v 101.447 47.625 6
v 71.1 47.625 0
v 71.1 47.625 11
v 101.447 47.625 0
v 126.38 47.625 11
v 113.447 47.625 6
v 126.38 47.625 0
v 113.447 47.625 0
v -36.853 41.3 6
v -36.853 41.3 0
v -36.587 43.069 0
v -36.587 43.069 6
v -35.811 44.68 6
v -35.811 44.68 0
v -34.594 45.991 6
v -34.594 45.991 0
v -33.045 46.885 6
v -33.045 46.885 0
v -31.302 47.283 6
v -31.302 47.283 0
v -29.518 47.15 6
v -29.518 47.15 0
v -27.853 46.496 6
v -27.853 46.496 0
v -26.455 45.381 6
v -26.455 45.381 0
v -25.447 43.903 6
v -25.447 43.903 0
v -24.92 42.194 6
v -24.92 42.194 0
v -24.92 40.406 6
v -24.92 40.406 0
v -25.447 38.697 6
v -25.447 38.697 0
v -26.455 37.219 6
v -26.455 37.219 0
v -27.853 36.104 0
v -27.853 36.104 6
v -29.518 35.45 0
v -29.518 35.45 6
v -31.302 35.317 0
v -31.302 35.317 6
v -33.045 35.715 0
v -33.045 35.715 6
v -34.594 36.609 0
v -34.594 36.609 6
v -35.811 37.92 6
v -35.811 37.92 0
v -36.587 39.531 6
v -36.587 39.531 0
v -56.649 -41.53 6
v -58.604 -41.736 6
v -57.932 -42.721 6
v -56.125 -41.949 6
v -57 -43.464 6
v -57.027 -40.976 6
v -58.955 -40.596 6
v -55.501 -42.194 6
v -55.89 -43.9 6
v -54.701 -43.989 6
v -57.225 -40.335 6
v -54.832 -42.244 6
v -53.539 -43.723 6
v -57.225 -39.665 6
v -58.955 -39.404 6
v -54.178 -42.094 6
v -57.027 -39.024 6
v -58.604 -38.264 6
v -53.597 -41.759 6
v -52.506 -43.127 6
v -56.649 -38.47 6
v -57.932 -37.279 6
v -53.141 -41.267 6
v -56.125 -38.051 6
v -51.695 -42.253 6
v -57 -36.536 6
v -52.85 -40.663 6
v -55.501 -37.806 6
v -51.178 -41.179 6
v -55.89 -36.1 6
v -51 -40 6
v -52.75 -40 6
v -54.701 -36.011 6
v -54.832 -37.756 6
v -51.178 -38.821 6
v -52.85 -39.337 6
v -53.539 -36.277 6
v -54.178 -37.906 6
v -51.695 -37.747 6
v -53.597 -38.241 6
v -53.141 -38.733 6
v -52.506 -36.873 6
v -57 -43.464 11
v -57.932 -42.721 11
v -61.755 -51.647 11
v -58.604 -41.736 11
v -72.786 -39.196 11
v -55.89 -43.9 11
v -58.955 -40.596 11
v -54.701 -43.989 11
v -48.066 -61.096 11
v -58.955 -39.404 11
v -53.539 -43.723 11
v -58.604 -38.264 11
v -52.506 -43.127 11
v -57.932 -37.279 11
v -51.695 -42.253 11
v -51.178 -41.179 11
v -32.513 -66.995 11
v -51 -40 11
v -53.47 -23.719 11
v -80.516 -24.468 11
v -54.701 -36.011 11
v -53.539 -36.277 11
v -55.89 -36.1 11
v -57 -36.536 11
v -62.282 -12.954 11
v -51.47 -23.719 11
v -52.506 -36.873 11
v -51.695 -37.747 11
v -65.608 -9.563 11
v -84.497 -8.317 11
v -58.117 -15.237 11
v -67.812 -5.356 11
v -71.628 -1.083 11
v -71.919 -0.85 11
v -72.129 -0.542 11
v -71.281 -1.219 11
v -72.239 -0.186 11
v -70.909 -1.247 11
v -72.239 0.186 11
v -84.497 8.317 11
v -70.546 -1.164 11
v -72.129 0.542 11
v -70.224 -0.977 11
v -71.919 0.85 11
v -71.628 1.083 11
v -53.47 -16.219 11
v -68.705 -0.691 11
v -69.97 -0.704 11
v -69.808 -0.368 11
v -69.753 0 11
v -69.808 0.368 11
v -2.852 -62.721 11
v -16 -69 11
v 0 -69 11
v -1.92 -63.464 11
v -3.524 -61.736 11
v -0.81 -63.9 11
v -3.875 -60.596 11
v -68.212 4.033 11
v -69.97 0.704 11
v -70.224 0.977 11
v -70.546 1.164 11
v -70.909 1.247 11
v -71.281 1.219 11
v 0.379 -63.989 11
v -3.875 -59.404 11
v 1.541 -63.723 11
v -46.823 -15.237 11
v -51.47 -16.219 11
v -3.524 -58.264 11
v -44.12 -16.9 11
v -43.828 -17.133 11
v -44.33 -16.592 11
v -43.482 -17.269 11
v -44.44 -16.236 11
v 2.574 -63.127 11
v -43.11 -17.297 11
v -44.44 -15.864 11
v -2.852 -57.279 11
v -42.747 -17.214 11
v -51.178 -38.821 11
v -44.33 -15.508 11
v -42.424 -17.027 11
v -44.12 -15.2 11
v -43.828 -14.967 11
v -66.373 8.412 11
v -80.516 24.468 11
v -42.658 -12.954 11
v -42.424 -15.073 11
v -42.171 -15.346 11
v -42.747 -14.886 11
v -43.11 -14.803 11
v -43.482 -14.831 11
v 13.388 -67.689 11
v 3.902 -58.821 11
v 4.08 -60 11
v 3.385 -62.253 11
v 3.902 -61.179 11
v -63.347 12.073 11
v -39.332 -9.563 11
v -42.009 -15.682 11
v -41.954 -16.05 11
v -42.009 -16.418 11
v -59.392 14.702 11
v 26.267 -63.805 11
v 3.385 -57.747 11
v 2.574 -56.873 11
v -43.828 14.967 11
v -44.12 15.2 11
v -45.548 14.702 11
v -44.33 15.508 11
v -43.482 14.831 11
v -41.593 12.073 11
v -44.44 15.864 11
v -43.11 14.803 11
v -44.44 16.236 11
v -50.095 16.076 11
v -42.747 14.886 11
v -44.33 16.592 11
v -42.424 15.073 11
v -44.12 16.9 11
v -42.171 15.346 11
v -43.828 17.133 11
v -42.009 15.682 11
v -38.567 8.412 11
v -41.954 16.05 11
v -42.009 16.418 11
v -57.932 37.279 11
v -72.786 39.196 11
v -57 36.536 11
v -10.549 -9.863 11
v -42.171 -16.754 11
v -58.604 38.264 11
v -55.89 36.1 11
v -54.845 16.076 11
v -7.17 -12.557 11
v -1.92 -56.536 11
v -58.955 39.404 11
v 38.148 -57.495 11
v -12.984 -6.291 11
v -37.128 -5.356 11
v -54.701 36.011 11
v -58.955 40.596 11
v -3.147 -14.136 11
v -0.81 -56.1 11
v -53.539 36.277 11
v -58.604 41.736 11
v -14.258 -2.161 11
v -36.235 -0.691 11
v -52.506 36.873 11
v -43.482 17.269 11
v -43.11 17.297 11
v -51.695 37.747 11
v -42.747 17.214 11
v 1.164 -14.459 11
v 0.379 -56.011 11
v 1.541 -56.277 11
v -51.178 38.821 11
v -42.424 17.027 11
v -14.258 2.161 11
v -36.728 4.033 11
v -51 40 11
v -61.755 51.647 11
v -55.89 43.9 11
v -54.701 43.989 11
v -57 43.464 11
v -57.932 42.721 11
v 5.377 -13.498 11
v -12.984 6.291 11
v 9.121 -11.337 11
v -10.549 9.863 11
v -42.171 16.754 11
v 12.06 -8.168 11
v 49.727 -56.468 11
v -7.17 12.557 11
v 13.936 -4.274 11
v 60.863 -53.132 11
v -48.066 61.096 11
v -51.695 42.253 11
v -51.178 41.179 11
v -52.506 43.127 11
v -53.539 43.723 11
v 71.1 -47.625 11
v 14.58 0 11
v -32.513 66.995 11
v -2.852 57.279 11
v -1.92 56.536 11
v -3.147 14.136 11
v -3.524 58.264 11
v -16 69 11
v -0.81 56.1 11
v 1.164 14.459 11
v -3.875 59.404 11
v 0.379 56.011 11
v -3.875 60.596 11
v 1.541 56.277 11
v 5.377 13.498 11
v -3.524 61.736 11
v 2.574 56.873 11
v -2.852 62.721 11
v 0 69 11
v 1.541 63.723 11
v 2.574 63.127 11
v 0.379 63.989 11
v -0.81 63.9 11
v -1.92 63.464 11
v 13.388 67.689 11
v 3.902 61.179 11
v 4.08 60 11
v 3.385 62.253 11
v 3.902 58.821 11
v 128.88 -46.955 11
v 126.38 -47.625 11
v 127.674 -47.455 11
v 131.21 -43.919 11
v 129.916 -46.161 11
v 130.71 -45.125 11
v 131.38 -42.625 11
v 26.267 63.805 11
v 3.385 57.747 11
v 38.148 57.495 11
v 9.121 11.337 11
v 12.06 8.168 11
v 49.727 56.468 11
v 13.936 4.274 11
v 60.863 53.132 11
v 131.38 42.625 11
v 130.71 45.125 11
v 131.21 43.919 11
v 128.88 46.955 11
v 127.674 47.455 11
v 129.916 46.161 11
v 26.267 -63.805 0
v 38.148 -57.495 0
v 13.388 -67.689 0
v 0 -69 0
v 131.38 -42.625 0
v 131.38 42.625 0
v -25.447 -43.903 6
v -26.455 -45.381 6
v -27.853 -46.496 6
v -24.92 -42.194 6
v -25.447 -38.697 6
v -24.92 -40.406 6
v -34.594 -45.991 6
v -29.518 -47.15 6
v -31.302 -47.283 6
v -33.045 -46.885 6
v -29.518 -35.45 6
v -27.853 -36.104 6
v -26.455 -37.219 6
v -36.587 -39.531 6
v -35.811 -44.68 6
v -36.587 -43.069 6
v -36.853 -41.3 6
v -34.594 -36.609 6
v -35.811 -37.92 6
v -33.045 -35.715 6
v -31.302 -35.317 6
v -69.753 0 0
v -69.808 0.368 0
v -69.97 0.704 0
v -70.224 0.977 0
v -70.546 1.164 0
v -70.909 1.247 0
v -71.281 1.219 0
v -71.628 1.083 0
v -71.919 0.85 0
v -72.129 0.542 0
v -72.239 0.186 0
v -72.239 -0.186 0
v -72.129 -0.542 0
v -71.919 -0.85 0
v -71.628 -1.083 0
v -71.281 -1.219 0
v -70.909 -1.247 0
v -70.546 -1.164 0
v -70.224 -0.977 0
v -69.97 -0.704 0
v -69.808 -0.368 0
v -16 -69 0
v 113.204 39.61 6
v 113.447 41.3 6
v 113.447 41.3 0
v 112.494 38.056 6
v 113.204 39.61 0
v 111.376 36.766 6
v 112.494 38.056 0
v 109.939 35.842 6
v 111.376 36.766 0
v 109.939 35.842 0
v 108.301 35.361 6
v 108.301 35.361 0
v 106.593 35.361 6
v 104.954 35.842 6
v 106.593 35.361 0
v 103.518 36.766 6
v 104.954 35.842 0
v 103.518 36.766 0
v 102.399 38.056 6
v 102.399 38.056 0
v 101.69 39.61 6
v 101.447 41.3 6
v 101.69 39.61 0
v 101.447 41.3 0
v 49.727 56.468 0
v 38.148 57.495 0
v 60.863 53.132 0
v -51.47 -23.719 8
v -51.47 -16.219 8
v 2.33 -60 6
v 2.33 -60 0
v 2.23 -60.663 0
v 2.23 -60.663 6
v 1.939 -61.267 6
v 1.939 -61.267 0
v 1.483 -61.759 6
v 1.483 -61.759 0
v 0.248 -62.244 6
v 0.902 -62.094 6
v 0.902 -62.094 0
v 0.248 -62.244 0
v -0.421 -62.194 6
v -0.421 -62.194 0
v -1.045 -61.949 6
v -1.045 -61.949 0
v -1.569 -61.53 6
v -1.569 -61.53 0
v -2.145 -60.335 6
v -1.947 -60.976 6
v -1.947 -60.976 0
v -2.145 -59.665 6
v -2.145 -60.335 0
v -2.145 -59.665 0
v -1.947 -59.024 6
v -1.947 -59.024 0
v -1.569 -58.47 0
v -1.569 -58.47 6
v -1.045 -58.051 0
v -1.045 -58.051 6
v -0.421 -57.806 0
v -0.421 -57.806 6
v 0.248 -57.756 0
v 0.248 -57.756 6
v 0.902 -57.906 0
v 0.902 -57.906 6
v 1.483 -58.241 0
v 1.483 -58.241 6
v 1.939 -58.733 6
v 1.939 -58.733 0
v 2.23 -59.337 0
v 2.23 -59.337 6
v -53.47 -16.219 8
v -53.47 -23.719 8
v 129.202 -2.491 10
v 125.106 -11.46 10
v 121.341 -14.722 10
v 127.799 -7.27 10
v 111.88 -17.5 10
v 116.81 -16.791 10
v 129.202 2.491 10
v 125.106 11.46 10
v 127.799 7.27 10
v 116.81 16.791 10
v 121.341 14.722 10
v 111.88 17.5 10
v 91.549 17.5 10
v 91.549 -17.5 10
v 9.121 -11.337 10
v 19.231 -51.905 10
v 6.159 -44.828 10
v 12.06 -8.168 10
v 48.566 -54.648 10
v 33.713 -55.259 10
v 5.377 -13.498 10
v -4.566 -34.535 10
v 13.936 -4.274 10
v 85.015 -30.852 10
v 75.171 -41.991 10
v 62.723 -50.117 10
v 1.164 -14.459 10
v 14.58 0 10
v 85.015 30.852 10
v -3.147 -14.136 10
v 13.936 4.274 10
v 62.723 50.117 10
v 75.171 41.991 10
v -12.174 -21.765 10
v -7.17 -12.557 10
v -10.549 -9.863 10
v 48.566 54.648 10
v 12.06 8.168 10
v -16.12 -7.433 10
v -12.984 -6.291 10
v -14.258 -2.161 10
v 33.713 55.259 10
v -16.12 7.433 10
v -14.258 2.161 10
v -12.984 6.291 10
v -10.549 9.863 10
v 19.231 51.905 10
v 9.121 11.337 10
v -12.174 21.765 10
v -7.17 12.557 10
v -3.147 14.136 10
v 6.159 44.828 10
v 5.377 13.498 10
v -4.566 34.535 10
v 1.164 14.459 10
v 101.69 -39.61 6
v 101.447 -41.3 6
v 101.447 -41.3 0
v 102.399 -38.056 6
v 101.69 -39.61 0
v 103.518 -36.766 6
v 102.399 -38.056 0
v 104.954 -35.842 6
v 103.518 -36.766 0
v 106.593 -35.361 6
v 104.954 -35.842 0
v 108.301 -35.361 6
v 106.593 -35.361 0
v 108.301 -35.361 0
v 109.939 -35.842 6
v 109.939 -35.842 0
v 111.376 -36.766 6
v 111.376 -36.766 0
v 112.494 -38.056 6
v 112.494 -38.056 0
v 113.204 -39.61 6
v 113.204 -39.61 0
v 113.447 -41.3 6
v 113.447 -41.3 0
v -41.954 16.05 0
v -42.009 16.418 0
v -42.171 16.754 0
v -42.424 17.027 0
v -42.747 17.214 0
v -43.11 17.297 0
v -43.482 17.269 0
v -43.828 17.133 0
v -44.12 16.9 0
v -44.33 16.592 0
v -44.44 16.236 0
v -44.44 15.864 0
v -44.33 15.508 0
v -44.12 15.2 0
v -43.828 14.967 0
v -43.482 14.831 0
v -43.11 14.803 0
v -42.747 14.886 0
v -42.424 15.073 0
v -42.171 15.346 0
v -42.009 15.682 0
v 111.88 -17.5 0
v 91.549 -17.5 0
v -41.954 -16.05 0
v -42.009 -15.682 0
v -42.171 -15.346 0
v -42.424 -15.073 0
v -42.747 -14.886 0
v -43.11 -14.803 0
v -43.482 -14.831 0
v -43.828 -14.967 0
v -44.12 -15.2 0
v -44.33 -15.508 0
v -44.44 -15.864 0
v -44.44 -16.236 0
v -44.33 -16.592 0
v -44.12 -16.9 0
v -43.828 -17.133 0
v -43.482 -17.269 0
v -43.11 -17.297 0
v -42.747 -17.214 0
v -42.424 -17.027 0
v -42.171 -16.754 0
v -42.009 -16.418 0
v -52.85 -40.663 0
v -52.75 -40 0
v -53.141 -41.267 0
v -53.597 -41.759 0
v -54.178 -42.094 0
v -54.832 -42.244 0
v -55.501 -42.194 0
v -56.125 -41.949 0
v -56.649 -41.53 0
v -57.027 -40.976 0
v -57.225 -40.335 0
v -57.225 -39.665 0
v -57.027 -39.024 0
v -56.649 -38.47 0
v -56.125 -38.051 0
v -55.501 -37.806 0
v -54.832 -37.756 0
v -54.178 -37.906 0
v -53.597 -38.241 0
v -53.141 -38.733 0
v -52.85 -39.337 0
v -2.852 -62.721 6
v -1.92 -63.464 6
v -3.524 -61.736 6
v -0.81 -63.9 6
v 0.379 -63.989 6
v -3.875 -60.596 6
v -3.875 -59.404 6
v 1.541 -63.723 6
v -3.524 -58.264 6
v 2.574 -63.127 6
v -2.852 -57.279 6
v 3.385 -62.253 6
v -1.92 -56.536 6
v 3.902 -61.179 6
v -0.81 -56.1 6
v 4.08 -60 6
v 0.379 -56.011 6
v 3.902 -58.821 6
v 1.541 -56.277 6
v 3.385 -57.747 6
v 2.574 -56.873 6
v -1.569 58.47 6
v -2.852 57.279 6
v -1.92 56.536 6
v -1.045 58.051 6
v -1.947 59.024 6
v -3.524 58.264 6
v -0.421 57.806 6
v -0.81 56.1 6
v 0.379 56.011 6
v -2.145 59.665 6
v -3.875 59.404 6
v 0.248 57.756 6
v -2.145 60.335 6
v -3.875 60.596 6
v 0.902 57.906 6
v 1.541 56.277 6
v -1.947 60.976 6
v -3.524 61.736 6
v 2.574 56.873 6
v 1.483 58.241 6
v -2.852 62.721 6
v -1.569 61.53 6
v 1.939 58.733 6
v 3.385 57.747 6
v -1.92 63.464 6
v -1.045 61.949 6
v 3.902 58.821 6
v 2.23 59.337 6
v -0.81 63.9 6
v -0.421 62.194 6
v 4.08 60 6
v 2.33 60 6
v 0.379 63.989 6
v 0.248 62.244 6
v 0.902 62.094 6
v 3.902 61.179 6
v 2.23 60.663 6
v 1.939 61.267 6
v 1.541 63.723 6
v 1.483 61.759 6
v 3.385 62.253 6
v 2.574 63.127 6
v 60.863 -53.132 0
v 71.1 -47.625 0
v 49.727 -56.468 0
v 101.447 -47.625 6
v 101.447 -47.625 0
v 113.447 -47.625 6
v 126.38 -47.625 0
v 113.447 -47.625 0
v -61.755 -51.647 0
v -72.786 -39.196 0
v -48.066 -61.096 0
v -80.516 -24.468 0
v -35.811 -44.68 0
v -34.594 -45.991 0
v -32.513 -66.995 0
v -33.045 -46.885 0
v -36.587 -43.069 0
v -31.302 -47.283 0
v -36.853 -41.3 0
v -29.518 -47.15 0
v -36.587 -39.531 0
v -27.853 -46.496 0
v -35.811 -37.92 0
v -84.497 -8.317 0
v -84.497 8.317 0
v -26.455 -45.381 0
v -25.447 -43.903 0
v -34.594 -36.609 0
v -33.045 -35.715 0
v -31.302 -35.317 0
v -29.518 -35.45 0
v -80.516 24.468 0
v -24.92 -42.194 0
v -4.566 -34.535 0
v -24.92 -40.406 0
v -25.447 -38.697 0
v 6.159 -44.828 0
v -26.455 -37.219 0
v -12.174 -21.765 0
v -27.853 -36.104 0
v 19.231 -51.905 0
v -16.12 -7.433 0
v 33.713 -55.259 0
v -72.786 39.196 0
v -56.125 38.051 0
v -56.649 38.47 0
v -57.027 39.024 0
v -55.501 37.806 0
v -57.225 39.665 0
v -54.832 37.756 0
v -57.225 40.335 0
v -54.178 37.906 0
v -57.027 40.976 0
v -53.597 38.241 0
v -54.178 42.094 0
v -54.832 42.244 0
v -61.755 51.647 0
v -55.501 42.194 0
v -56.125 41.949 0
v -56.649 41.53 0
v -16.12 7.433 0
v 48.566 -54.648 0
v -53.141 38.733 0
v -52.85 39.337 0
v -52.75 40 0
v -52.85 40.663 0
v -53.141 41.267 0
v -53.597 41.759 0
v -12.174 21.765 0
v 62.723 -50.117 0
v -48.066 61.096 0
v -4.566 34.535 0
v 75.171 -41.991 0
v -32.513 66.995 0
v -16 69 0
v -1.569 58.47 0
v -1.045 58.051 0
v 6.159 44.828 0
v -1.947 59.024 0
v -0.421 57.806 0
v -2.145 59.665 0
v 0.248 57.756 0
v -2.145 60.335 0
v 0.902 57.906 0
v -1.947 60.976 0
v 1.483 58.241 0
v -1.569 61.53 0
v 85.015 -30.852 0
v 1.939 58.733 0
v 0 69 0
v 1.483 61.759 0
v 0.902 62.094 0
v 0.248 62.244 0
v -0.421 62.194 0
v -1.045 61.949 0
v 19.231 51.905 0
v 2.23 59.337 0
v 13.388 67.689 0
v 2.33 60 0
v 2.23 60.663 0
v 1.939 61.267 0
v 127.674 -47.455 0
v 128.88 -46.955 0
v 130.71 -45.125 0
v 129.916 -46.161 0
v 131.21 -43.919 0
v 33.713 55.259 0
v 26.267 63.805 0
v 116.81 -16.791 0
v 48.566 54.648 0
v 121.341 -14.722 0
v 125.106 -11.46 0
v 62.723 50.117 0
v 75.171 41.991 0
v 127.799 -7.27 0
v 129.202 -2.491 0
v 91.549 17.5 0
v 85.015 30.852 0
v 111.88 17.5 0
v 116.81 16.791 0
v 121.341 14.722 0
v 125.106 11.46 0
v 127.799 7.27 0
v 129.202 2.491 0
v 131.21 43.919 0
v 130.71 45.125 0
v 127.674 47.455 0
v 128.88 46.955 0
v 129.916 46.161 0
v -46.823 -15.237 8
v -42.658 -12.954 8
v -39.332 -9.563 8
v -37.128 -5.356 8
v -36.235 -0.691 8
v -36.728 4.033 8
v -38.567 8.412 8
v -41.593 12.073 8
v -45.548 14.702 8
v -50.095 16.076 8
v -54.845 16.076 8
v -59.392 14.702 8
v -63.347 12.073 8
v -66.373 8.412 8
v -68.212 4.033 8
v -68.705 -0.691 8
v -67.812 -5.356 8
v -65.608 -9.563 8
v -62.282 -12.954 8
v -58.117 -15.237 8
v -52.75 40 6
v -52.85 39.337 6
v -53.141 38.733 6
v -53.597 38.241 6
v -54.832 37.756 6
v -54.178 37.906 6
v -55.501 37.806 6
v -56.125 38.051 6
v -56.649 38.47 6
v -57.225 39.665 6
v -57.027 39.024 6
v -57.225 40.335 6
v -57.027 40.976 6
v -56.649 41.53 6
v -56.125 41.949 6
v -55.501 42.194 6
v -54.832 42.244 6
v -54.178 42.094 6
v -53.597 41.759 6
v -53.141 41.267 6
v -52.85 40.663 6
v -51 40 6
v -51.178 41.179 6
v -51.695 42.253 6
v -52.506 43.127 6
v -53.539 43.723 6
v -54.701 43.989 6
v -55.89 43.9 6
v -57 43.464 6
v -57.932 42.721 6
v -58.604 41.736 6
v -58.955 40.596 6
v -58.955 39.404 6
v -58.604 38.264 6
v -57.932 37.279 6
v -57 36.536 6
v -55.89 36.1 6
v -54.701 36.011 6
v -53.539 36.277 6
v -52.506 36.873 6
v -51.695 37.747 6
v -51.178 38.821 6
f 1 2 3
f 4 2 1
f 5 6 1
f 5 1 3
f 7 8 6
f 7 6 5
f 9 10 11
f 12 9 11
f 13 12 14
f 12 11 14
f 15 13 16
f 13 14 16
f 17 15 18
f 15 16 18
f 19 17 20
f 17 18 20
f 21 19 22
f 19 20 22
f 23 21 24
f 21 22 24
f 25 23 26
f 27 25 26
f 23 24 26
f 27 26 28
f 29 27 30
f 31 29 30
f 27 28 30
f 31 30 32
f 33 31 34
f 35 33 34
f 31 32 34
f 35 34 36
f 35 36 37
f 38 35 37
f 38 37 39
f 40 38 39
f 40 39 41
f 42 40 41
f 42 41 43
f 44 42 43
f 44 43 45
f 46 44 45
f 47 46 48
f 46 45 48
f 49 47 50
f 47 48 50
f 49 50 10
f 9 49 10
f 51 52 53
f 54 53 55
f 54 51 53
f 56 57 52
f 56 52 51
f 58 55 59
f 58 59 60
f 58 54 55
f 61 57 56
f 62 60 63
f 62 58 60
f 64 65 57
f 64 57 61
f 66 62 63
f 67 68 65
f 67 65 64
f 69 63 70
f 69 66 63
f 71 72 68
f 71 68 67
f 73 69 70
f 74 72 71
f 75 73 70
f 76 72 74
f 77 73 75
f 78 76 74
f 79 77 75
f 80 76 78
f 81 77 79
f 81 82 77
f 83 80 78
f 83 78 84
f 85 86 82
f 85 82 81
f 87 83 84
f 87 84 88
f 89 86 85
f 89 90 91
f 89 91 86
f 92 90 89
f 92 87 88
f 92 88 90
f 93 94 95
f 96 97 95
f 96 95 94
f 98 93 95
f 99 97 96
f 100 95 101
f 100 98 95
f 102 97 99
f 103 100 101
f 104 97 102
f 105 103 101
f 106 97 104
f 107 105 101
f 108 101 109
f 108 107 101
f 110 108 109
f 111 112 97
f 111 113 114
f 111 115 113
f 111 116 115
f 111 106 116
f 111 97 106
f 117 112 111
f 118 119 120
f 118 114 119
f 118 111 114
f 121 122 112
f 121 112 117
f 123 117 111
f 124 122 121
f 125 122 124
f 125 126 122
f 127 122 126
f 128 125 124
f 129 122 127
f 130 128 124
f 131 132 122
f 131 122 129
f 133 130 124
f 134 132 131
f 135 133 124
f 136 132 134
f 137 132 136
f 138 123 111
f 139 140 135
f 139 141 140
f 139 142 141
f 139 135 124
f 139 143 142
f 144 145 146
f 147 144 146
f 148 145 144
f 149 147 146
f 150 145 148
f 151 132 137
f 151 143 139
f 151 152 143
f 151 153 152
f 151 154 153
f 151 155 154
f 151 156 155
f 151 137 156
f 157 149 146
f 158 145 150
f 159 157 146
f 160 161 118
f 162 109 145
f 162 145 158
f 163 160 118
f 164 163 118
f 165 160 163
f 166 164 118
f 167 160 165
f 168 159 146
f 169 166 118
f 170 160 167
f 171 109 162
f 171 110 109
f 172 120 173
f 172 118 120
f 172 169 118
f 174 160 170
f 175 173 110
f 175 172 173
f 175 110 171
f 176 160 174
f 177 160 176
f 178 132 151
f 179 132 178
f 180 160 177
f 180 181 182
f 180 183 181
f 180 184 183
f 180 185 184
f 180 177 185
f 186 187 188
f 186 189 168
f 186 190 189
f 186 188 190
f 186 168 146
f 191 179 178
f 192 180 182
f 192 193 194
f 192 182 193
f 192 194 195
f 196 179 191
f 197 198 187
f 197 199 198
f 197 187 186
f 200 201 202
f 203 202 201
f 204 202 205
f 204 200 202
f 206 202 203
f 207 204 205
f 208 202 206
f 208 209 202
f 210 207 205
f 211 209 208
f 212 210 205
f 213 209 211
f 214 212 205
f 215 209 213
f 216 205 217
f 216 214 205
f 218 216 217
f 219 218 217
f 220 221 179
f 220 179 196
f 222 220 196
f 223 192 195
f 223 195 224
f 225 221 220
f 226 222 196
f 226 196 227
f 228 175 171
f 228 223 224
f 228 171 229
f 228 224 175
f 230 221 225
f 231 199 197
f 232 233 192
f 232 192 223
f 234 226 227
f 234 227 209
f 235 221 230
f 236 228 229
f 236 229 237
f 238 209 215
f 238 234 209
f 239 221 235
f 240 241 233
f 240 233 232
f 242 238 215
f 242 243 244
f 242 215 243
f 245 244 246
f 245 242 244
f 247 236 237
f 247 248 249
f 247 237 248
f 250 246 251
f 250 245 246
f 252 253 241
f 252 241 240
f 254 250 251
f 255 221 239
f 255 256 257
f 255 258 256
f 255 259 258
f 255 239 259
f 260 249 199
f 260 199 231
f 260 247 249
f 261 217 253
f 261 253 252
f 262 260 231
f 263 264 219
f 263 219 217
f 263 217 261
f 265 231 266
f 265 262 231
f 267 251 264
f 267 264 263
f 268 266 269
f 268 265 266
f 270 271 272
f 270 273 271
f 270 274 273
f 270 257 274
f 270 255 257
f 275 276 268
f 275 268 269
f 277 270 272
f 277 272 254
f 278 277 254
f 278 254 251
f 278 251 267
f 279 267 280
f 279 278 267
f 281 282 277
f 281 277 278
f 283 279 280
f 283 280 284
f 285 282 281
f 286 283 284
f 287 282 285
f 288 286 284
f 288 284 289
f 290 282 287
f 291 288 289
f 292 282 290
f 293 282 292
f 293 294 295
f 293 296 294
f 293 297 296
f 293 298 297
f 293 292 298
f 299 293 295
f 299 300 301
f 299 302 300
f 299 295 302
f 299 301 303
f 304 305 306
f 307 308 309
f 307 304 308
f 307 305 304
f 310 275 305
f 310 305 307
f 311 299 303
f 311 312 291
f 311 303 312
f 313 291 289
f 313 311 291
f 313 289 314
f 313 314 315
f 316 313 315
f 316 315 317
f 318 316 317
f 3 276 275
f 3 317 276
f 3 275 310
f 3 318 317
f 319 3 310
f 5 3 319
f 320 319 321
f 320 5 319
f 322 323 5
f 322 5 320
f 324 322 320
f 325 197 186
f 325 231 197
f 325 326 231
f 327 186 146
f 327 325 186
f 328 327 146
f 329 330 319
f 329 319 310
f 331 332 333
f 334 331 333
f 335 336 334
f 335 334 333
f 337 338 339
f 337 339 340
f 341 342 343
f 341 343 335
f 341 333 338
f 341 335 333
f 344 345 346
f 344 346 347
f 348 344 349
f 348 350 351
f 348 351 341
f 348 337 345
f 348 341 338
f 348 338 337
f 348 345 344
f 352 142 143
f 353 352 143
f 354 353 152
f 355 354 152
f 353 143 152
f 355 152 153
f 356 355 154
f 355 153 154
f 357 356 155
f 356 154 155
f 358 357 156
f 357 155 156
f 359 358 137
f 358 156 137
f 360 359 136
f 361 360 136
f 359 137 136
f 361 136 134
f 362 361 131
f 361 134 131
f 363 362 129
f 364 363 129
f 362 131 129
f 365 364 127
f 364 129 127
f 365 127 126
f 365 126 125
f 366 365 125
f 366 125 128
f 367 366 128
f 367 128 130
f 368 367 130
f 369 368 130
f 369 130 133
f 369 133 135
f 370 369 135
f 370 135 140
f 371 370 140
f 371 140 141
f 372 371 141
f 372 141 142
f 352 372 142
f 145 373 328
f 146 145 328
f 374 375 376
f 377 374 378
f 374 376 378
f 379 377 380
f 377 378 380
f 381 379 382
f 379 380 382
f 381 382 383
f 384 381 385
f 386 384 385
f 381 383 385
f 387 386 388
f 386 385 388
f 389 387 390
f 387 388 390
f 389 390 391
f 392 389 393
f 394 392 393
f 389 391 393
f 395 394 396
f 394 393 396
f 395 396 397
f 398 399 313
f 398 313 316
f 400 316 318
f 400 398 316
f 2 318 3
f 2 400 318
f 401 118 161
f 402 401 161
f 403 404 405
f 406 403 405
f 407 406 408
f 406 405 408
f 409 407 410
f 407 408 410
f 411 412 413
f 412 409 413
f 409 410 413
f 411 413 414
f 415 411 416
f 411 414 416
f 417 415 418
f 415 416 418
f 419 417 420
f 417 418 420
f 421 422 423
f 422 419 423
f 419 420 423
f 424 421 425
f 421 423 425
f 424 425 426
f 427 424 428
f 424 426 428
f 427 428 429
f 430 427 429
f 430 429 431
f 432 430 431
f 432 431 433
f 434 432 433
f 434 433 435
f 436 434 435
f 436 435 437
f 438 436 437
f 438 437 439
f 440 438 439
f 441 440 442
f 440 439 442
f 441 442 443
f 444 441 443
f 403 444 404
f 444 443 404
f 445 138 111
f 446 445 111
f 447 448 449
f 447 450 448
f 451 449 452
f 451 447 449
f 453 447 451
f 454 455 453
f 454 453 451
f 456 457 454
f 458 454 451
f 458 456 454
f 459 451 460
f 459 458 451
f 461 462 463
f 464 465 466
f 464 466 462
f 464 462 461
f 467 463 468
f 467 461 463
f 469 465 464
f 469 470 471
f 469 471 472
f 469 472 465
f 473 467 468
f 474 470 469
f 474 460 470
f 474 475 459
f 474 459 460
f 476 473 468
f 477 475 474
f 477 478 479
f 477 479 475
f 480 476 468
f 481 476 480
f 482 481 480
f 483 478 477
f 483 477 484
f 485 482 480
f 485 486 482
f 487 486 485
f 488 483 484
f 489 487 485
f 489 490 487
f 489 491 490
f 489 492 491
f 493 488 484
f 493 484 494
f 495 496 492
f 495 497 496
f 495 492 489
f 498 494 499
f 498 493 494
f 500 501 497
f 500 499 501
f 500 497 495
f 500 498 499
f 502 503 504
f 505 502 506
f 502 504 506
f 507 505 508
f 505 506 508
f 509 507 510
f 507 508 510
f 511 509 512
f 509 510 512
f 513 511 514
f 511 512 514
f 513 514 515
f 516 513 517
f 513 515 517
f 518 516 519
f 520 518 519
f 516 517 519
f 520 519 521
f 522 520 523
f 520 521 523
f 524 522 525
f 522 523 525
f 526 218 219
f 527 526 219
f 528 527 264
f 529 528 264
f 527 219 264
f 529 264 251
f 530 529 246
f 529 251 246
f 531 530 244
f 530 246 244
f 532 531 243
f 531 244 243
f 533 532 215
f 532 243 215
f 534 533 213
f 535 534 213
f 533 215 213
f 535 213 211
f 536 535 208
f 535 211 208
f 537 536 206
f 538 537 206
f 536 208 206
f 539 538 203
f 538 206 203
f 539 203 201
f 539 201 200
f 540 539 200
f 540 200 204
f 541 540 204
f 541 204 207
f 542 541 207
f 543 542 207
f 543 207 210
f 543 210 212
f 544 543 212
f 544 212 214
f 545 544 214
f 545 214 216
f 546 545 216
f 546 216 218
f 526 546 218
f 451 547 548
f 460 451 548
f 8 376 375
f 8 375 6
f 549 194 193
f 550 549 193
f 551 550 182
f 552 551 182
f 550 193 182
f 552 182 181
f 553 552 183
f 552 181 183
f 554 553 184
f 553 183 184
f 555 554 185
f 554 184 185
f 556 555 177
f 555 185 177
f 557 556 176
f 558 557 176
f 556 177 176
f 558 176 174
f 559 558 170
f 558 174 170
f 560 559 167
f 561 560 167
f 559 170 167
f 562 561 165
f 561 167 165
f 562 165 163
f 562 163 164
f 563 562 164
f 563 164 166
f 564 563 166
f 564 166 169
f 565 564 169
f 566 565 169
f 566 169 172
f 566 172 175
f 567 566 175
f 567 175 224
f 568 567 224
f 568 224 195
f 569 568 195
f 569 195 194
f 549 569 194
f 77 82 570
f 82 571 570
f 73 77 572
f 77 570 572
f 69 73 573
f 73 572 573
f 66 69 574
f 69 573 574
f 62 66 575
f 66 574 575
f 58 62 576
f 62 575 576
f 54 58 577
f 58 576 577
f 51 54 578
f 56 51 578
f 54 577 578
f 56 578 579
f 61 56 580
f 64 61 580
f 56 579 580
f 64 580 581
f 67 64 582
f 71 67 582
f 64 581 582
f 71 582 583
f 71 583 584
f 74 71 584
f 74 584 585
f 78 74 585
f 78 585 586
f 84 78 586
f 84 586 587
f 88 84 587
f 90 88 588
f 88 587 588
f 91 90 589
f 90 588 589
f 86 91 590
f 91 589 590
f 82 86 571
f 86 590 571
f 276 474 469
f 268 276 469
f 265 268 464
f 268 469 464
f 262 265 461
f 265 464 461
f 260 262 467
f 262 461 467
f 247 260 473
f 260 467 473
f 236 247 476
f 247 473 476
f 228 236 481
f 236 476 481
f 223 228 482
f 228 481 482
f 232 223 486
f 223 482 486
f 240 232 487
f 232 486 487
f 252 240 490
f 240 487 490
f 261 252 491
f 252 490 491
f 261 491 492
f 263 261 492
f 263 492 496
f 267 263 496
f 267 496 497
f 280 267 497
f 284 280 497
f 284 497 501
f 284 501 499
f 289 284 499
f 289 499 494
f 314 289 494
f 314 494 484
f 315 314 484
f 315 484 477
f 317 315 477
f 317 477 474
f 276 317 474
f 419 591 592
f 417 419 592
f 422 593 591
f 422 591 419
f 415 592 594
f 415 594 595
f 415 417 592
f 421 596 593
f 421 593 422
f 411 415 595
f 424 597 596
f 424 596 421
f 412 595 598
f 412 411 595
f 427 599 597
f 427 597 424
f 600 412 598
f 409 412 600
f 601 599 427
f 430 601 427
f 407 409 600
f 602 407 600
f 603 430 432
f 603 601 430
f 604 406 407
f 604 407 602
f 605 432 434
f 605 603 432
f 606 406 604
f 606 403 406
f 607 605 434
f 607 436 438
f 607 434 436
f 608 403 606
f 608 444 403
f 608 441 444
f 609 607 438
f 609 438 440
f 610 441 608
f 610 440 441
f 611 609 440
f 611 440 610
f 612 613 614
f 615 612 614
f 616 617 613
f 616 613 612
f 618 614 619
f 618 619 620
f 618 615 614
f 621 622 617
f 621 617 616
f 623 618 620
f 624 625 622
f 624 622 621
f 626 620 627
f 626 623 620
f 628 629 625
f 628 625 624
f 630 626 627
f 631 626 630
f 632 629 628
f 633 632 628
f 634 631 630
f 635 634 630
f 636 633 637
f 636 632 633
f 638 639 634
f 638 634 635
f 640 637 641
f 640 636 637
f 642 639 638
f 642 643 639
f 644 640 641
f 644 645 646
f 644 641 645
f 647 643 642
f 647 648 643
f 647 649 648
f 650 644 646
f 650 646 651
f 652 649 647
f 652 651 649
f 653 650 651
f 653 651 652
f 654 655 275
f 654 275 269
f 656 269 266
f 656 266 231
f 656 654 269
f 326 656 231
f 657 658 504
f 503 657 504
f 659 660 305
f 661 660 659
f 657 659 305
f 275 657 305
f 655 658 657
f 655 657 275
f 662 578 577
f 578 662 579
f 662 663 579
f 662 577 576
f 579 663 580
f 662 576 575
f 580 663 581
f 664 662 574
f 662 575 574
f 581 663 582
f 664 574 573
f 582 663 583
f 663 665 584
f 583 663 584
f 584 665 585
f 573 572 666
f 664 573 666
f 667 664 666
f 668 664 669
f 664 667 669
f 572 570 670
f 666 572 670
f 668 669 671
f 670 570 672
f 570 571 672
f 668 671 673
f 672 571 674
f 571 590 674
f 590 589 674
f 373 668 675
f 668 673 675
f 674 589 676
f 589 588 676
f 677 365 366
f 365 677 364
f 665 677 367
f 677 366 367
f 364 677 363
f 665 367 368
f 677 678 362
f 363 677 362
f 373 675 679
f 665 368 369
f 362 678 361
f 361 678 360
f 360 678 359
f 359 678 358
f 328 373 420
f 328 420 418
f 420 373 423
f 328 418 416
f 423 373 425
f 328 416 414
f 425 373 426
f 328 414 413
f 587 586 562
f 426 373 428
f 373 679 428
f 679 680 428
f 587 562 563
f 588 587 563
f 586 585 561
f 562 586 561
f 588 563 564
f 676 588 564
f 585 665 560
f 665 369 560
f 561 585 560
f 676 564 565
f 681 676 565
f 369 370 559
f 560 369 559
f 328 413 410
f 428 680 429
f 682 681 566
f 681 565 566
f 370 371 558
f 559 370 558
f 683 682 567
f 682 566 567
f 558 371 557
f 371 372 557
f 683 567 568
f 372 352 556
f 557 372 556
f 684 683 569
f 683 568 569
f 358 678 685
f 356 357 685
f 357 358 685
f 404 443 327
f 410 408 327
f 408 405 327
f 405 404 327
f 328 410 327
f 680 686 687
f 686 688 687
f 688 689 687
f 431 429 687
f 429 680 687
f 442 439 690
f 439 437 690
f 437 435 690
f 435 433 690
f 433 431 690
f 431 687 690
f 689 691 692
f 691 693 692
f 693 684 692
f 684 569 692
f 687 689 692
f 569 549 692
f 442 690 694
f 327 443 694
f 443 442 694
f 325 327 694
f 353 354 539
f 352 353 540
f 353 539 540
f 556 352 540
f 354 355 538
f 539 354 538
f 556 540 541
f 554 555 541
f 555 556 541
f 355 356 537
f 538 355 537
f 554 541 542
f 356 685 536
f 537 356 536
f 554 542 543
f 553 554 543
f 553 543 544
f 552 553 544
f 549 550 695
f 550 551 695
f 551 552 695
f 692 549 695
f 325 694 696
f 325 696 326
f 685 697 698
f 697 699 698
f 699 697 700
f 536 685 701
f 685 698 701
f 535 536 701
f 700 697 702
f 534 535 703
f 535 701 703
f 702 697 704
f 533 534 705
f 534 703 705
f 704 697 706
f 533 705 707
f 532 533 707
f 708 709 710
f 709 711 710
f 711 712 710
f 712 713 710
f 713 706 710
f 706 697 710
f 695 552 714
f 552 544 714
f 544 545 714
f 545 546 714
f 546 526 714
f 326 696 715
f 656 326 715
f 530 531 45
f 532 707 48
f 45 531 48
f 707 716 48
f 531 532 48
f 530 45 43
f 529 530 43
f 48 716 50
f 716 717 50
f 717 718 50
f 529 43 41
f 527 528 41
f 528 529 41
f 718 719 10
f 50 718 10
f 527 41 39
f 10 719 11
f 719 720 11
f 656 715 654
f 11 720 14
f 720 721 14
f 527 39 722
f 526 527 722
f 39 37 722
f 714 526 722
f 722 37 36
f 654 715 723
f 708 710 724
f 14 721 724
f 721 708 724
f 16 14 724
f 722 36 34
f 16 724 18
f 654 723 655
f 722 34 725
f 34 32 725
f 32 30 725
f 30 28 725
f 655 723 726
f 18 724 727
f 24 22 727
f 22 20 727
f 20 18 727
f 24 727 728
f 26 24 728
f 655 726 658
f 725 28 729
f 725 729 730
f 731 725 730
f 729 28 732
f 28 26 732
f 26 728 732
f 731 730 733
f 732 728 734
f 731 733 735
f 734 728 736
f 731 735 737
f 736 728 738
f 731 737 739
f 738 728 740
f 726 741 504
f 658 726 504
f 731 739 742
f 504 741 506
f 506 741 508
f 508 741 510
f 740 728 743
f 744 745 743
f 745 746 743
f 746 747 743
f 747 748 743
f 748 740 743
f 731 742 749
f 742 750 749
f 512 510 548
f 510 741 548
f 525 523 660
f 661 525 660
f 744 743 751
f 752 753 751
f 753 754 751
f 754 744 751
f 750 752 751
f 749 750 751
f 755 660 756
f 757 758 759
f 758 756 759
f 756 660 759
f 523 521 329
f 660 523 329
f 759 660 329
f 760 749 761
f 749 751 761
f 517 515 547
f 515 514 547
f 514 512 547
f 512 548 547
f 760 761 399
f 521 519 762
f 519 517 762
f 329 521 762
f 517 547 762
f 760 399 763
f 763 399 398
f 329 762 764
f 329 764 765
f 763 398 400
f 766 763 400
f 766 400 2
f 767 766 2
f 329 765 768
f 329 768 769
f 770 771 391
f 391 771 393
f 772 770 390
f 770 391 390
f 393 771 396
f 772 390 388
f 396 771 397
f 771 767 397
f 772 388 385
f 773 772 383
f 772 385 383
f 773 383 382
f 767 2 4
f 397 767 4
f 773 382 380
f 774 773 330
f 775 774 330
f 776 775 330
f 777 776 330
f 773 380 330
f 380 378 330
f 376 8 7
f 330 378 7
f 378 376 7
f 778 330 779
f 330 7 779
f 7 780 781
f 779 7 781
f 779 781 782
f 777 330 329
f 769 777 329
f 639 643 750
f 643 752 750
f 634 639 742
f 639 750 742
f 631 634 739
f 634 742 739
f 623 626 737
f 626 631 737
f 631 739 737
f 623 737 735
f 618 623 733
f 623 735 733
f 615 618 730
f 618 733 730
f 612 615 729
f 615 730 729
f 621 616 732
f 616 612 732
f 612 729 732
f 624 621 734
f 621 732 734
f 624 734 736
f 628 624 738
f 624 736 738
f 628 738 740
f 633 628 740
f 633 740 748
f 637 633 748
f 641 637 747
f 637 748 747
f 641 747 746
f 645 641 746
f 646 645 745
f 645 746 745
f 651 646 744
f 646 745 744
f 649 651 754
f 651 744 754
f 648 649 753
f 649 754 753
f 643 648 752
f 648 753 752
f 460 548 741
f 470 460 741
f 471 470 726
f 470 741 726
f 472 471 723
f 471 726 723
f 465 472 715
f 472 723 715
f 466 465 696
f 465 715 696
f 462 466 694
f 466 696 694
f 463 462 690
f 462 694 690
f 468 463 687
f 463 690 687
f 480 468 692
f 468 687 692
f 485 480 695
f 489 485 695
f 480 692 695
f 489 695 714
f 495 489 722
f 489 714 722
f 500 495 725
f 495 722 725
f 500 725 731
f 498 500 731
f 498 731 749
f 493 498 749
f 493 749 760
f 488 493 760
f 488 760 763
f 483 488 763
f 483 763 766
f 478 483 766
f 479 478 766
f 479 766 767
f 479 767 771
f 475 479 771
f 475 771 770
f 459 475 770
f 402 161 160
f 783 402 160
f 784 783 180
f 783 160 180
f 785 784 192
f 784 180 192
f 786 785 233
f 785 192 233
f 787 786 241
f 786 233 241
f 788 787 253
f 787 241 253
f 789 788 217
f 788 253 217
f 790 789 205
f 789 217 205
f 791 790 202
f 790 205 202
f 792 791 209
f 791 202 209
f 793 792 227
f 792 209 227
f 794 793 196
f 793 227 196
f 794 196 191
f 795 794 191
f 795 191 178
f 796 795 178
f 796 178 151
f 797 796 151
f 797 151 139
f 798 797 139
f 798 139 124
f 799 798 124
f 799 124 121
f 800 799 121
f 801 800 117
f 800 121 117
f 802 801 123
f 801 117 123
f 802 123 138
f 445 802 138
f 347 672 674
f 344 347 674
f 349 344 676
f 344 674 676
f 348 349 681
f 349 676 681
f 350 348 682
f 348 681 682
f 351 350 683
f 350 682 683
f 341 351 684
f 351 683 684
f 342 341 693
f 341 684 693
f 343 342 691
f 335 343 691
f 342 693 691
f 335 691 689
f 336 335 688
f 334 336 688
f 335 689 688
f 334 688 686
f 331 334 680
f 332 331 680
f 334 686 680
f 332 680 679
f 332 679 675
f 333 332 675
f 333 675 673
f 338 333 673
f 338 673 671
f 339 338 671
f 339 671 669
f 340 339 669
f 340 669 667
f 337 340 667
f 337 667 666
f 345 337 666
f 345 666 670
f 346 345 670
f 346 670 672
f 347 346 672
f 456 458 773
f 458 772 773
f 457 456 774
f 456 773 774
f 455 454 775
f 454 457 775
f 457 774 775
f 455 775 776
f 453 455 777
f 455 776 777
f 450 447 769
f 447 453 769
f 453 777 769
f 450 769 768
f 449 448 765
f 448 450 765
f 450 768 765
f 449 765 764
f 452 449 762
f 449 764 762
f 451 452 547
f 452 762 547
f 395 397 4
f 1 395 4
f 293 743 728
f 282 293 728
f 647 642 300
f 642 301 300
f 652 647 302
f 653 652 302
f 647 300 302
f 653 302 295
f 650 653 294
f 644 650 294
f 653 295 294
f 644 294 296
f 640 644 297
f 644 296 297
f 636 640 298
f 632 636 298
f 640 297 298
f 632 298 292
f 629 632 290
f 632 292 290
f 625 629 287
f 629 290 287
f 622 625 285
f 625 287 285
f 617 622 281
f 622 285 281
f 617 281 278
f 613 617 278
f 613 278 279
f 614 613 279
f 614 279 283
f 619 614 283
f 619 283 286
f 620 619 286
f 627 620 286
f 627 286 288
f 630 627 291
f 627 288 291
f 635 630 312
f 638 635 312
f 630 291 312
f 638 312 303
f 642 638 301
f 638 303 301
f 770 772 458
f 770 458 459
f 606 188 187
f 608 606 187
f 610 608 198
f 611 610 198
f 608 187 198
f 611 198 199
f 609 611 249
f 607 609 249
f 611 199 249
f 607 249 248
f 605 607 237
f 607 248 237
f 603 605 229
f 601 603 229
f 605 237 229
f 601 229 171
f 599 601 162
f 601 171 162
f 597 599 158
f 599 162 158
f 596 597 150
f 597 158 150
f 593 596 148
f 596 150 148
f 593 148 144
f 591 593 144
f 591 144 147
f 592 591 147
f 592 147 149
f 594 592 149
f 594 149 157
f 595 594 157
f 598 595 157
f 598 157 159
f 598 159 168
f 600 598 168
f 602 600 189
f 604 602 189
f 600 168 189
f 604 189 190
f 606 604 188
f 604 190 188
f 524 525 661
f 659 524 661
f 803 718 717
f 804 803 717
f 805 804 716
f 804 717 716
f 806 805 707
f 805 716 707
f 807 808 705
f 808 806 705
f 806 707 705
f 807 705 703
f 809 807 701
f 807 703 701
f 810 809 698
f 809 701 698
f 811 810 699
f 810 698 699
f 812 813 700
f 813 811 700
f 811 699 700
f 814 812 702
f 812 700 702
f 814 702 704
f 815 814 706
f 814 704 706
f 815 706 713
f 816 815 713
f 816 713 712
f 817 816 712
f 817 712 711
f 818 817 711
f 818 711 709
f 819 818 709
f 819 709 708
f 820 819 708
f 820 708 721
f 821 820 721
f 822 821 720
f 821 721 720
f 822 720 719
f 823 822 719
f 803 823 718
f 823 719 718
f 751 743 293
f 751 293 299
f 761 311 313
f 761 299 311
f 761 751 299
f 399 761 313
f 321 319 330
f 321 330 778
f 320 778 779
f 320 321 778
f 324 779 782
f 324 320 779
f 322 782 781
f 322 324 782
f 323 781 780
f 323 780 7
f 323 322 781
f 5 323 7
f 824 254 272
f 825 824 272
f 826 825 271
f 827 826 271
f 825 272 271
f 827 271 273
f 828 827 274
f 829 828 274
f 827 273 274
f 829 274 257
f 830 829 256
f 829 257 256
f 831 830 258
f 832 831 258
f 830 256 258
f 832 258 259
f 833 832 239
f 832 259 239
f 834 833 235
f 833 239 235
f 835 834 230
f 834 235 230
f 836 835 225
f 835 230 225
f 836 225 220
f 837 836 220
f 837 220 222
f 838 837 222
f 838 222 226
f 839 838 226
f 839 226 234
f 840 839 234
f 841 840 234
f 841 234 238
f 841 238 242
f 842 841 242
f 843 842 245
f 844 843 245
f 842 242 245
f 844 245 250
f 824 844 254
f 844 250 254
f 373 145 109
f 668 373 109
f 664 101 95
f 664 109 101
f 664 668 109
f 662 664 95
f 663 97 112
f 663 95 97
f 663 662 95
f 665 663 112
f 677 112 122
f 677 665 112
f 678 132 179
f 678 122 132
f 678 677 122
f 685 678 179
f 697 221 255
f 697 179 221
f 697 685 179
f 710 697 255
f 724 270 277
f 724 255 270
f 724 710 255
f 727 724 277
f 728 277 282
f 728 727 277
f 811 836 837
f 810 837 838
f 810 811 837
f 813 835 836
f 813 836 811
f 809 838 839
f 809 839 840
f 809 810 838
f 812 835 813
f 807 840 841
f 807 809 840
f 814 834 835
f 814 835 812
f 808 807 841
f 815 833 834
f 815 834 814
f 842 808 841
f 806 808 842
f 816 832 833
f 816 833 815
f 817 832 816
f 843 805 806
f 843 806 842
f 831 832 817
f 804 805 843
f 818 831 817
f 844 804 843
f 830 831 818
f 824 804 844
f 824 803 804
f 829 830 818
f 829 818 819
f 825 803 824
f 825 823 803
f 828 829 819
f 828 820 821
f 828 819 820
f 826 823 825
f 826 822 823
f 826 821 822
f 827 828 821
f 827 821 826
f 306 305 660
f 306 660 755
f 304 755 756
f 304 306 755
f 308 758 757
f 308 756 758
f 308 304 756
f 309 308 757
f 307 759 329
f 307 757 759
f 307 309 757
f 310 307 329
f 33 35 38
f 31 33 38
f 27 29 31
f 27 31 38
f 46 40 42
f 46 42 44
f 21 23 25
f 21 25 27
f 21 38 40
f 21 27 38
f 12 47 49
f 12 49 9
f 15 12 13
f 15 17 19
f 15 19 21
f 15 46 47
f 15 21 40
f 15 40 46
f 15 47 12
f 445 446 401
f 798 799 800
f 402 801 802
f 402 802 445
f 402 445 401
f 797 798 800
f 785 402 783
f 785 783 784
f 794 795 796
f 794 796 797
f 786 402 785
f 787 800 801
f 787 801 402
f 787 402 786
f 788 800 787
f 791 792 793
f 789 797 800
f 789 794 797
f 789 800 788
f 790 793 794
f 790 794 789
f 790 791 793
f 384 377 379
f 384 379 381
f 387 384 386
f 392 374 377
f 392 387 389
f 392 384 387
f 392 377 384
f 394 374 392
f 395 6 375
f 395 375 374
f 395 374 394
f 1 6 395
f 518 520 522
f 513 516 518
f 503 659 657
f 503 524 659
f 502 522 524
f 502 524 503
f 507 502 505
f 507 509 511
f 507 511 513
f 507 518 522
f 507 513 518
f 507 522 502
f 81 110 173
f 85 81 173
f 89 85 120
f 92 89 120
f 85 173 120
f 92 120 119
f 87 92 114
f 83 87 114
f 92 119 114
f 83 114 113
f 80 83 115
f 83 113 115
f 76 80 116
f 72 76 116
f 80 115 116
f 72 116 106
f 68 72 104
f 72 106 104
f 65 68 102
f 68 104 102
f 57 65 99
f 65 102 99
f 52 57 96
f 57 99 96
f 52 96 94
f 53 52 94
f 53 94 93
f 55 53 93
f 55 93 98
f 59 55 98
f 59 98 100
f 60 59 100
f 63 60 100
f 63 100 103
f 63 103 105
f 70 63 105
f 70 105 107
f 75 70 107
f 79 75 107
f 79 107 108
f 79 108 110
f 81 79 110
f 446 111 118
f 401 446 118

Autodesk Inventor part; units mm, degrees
ref_plane "YZ Plane" through (0, 0, 0) normal (1, 0, 0) x (0, 1, 0)
ref_plane "XZ Plane" through (0, 0, 0) normal (0, 1, 0) x (-1, 0, 0)
ref_plane "XY Plane" through (0, 0, 0) normal (0, 0, 1) x (1, 0, 0)
sketch "Sketch1" plane through (0, 0, 0) normal (0, 0, 1) x (1, 0, 0)
  line L0 (-19.2849, 35) -> (-19.2849, -35) construction
  line L1 (19.7114, 54.5) -> (19.7114, -54.5) construction
  line L2 (-19.2849, 35) -> (19.7114, 54.5) construction
  line L3 (-19.2849, -35) -> (19.7114, -54.5) construction
  circle A0 centre (0.08, 0) radius 14.5
  line L4 (-19.2849, 35) -> (0.08, 0) construction
  line L5 (0.08, 0) -> (-19.2849, -35) construction
  circle A1 centre (19.7114, 54.5) radius 1.6 construction
  circle A2 centre (-19.2849, 35) radius 1.6 construction
  circle A3 centre (-19.2849, -35) radius 1.6 construction
  circle A4 centre (19.7114, -54.5) radius 1.6 construction
  line L6 (-16, -69) -> (0, -69)
  line L7 (0, 69) -> (-16, 69)
  arc A5 (-16, 69) -> (-16, -69) centre (-16, 0) ccw
  arc A6 (0, -69) -> (0, 69) centre (0, 0) ccw
  line L8 (-85, 0) -> (69, 0) construction
  circle A7 centre (-19.2849, 35) radius 3 construction
  circle A8 centre (-19.2849, -35) radius 3 construction
  circle A9 centre (19.7114, 54.5) radius 3 construction
  circle A10 centre (19.7114, -54.5) radius 3 construction
  line L9 (0.08, 60) -> (0.08, -60) construction
  line L10 (-55, -40) -> (-55, 40) construction
  circle A11 centre (-55, 40) radius 2.25
  circle A12 centre (-55, -40) radius 2.25
  circle A13 centre (0.08, -60) radius 2.25
  circle A14 centre (0.08, 60) radius 2.25
  point P0 (-19.2849, 0)
  point P1 (19.7114, 0)
  point P2 (-55, 0)
  dimension "d0" = 70
  dimension "d1" = 109
  dimension "d2" = 43.6
  dimension "d3" = 29
  dimension "d4" = 40
  dimension "d5" = 3.2
  dimension "d7" = 138
  dimension "d8" = 154
  dimension "d33" = 6
  dimension "d55" = 85.08
  dimension "d74" = 80
  dimension "d76" = 30
  dimension "d77" = 4.5
  dimension "d78" = 120
extrude "Extrusion1" add sketch "Sketch1" along normal blind 11 contours A5 L7 A6 L6 | A11 | A12 | A13 | A14
sketch "Sketch2" plane through (0, 0, 11) normal (0, 0, 1) x (1, 0, 0)
  circle A0 centre (-52.47, 0) radius 18.5329 construction
  circle A1 centre (-71.0029, 0) radius 1.25
  circle A2 centre (-43.2035, 16.05) radius 1.25
  circle A3 centre (-43.2035, -16.05) radius 1.25
  circle A4 centre (0.08, 0) radius 14.5 projected
  line L0 (-16, -69) -> (0, -69) projected
  arc A5 (0, -69) -> (0, 69) centre (0, 0) ccw projected
  line L1 (0, 69) -> (-16, 69) projected
  arc A6 (-16, 69) -> (-16, -69) centre (-16, 0) ccw projected
  arc A7 (-16, 69) -> (-16, -69) centre (-16, 0) ccw construction
  line L2 (-85, 0) -> (69, 0) construction
  circle A8 centre (-43.2035, -16.05) radius 5
  circle A9 centre (-43.2035, 16.05) radius 5
  circle A10 centre (-71.0029, 0) radius 5
  circle A11 centre (-52.47, 0) radius 16.25
  line L3 (-53.47, -16.2192) -> (-53.47, -23.7192)
  line L4 (-53.47, -23.7192) -> (-51.47, -23.7192)
  line L5 (-51.47, -23.7192) -> (-51.47, -16.2192)
  line L6 (-52.47, -23.7192) -> (-52.47, 0) construction
  arc A12 (-53.47, -16.2192) -> (-51.47, -16.2192) centre (-52.47, 0) ccw
  dimension "d67" = 32.5
  dimension "d11" = 120
  dimension "d12" = 120
  dimension "d13" = 32.1
  dimension "d14" = 52.55
  dimension "d40" = 2.5
  dimension "d49" = 10
  dimension "d97" = 7.5
  dimension "d98" = 2
sketch "Sketch3" plane through (0, 0, 0) normal (0, 0, -1) x (-1, 0, 0)
  circle A0 centre (30.8533, 41.3) radius 6
  circle A1 centre (-0.08, 0) radius 14.5 projected
  circle A2 centre (30.8533, -41.3) radius 6
  line L0 (30.8533, 41.3) -> (-0.08, 0) construction
  line L1 (-0.08, 0) -> (30.8533, -41.3) construction
  circle A3 centre (-38.88, 0) radius 55.5
  circle A4 centre (-0.08, 0) radius 14.5 construction
  line L2 (16, -69) -> (0, -69) construction
  arc A5 (16, -69) -> (16, 69) centre (16, 0) ccw construction
  line L3 (0, 69) -> (16, 69) construction
  arc A6 (0, 69) -> (0, -69) centre (0, 0) ccw construction
  arc A7 (16, -69) -> (16, 69) centre (16, 0) ccw construction
  line L4 (85, 0) -> (-129.38, 0) construction
  arc A8 (0, 69) -> (0, -69) centre (0, 0) ccw construction
  line L5 (30.8533, 41.3) -> (30.8533, -41.3)
  line L6 (37.1783, 47.625) -> (-131.38, 47.625)
  line L7 (-131.38, 47.625) -> (-131.38, -47.625)
  line L8 (-131.38, -47.625) -> (37.1783, -47.625)
  line L9 (37.1783, -47.625) -> (37.1783, 47.625)
  line L10 (30.8533, 41.3) -> (37.1783, 41.3) construction
  line L11 (30.8533, 41.3) -> (30.8533, 47.625) construction
  line L12 (30.8533, -41.3) -> (37.1783, -41.3) construction
  line L13 (30.8533, -41.3) -> (30.8533, -47.625) construction
  circle A9 centre (-107.4467, 41.3) radius 6
  circle A10 centre (-107.4467, -41.3) radius 6
  line L14 (30.8533, 41.3) -> (-107.4467, 41.3) construction
  line L15 (30.8533, -41.3) -> (-107.4467, -41.3) construction
  circle A11 centre (-111.88, 0) radius 17.5
  line L16 (-111.88, 17.5) -> (-91.5488, 17.5)
  line L17 (-111.88, -17.5) -> (-91.5488, -17.5)
  circle A12 centre (-38.88, 0) radius 57.5
  line L18 (-131.38, 0) -> (-129.38, 0)
  line L19 (-111.88, 17.5) -> (-111.88, -17.5) construction
  line L20 (-113.4467, 41.3) -> (-113.4467, 47.625)
  line L21 (-101.4467, 41.3) -> (-101.4467, 47.625)
  line L22 (-113.4467, 41.3) -> (-101.4467, 41.3)
  line L23 (-113.4467, 47.625) -> (-101.4467, 47.625)
  line L24 (-113.4467, -41.3) -> (-113.4467, -47.625)
  line L25 (-113.4467, -47.625) -> (-101.4467, -47.625)
  line L26 (-101.4467, -47.625) -> (-101.4467, -41.3)
  line L27 (-101.4467, -41.3) -> (-113.4467, -41.3)
  dimension "d15" = 51.6
  dimension "d17" = 111
  dimension "d18" = 82.6
  dimension "d22" = 95.25
  dimension "d29" = 138.3
  dimension "d30" = 35
  dimension "d59" = 2
  dimension "d60" = 12
  dimension "d81" = 2
  dimension "d99" = 38.8
extrude "Extrusion4" add sketch "Sketch3" against normal up to surface (11 mm away)
extrude "Extrusion14" cut sketch "Sketch3" against normal blind 6 contours A0 | A2 | L22 A9 | A9 L22 | L27 A10 | A10 L27
extrude "Extrusion15" cut sketch "Sketch3" against normal blind 10 contours A3 L6 L8 | A3 A11 A12 L16 | A11 A12 | A3 L17 A12 A11 | A3 L6 | A12 A11 L16 | A12 A11 | A12 L17 A11 | L8 A3
extrude "Extrusion16" cut sketch "Sketch2" against normal through all contours A1 | A2 | A3
extrude "Extrusion17" cut sketch "Sketch2" against normal blind 3 contours A11 A8 | A8 A11 A10 A9 | L5 L4 L3 A11 | A9 A11 | A11 A10 picked at (-44.8177, -13.2541) picked at (-44.8177, 13.2541) picked at (-67.7746, 0)
fillet "Fillet1" radius 5 1 edges at (131.38, -47.625, 5.5)
fillet "Fillet2" radius 5 1 edges at (131.38, 47.625, 5.5)
extrude "Extrusion20" cut sketch "Sketch1" along normal through all contours A11 | A12 | A13 | A14
sketch "Sketch10" plane through (0, 0, 11) normal (0, 0, 1) x (1, 0, 0)
  circle A0 centre (0.08, -60) radius 2.25 projected
  circle A1 centre (0.08, 60) radius 2.25 projected
  circle A2 centre (-55, 40) radius 2.25 projected
  circle A3 centre (-55, -40) radius 4
  circle A4 centre (0.08, -60) radius 4
  circle A5 centre (0.08, 60) radius 2.25 projected
  circle A6 centre (0.08, 60) radius 4
  circle A7 centre (-55, 40) radius 4
  point P0 (0, 0)
  dimension "d88" = 8
extrude "Extrusion21" cut sketch "Sketch10" against normal blind 5
thread "Thread1" size "M3x0.5" class "6H" standard "ANSI Metric M Profile" full length
thread "Thread2" size "M3x0.5" class "6H" standard "ANSI Metric M Profile" full length
thread "Thread3" size "M3x0.5" class "6H" standard "ANSI Metric M Profile" full length
extrude "Extrusion22" cut sketch "Sketch3" against normal up to surface (6 mm away) contours L21 A9 L20 L6 | L8 L24 A10 L26
properties part number "AZ-FLDIC-FWup bottom adapter"
